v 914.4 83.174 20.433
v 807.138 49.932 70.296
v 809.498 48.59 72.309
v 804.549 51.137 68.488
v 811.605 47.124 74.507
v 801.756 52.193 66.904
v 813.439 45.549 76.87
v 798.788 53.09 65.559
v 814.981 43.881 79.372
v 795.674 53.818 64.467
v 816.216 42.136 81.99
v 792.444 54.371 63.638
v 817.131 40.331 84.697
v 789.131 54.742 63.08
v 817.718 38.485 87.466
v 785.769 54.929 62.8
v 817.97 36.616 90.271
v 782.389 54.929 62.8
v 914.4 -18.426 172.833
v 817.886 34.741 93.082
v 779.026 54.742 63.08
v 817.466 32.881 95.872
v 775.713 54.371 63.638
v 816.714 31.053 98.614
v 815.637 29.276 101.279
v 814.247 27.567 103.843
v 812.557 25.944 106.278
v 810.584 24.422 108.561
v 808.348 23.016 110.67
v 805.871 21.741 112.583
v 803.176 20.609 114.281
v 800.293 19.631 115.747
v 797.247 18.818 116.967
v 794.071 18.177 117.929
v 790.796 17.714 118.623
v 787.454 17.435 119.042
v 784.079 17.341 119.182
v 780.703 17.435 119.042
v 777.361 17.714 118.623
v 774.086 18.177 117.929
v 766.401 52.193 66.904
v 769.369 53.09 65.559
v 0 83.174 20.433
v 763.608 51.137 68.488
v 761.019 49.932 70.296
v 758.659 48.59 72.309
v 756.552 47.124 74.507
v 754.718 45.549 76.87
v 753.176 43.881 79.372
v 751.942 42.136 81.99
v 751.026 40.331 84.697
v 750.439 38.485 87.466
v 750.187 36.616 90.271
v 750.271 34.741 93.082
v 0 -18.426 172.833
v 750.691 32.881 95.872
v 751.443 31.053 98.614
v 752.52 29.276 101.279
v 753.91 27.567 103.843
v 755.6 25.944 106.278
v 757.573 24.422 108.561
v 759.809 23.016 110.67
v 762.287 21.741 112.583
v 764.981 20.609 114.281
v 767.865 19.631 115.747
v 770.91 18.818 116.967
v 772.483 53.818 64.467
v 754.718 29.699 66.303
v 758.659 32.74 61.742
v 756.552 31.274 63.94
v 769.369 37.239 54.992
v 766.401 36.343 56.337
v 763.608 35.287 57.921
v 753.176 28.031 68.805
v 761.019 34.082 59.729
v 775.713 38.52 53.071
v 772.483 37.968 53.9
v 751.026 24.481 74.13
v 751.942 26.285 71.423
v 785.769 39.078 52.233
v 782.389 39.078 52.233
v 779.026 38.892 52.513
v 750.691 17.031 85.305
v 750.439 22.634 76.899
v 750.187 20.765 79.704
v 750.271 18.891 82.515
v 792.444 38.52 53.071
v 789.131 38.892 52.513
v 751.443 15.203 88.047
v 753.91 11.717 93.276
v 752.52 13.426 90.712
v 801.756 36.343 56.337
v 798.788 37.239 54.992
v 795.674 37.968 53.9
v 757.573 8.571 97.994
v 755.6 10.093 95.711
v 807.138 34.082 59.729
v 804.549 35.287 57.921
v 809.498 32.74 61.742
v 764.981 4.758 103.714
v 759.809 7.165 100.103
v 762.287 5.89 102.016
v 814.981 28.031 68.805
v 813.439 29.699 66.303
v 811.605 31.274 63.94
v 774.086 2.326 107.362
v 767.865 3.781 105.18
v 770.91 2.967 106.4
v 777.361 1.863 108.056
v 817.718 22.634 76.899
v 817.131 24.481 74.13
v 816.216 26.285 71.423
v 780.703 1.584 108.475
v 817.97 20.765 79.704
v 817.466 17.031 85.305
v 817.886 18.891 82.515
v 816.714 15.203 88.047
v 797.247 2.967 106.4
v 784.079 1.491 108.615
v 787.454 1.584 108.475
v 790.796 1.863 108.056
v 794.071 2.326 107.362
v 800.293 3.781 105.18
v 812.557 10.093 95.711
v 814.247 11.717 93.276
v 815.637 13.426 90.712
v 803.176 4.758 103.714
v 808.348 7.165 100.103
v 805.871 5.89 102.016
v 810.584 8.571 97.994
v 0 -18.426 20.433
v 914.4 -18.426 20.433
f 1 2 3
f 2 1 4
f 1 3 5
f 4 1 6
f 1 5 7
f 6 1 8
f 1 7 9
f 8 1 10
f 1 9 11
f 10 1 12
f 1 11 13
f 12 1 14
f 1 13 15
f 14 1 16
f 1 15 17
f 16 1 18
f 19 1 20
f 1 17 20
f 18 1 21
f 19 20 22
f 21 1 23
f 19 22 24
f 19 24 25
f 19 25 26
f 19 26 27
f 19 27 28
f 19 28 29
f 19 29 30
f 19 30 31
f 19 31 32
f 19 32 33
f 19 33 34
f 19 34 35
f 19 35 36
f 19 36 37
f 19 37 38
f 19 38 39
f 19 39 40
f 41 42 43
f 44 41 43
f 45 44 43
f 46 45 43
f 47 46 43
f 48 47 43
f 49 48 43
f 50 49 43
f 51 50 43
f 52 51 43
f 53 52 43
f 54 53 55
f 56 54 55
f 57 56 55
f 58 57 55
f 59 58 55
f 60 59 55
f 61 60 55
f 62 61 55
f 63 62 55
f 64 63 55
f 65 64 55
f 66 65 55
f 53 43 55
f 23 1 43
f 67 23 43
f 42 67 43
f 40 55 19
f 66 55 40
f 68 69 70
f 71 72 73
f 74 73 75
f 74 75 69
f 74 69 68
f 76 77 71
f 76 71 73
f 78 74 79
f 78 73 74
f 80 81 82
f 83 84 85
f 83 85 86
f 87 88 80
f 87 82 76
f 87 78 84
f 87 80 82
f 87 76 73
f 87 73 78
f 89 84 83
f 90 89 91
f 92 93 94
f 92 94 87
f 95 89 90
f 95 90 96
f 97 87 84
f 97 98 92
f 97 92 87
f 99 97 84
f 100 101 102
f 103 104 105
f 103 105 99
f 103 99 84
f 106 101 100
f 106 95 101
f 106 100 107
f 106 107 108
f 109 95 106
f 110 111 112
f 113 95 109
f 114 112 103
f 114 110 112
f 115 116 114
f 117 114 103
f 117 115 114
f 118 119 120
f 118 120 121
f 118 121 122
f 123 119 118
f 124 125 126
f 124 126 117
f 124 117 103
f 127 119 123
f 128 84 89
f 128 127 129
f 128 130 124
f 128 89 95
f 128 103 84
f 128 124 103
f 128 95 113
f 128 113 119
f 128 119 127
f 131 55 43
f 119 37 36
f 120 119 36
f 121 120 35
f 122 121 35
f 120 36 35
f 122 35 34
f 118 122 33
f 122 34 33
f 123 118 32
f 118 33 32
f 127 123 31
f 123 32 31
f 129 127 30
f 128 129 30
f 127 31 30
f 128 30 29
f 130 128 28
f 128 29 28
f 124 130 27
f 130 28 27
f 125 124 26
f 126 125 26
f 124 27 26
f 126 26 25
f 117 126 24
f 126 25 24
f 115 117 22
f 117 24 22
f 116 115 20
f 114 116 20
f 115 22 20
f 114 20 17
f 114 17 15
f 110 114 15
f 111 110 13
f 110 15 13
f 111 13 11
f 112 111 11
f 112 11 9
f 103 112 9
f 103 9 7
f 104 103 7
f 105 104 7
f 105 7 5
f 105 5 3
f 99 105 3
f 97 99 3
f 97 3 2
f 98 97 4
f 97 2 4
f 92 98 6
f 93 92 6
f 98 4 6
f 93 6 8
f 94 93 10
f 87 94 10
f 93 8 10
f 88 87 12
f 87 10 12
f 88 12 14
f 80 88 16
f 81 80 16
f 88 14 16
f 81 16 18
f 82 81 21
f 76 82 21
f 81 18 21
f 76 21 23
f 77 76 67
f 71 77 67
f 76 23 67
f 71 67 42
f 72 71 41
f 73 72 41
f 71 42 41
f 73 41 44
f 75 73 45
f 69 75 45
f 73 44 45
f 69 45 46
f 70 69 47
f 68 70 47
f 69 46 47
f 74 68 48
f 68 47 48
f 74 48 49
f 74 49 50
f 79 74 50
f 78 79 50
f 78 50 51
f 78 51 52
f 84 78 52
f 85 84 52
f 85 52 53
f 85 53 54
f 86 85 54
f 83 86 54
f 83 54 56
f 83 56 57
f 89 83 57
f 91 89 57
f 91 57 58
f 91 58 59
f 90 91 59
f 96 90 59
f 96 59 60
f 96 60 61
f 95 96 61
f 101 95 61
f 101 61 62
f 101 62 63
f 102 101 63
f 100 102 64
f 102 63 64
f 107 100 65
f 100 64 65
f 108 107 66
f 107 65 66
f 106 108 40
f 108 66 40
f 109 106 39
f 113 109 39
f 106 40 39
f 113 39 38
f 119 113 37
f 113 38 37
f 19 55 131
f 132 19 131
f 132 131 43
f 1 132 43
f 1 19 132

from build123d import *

# Parameters (mm, degrees)
BOSS_EXTRUDE1_DEPTH = 914.4
SKETCH6_R           = 33.902275387
CUT_EXTRUDE1_DEPTH  = 19.05


with BuildPart() as part:
    # Sketch1 → Boss-Extrude1 (new body)
    with BuildSketch(Plane(origin=(0, 0, 0), x_dir=(0, 0, -1), z_dir=(1, 0, 0))):
        Polygon((-20.432712568, 83.174071702), (-172.832712568, -18.425928298), (-20.432712568, -18.425928298), align=None)
    extrude(amount=BOSS_EXTRUDE1_DEPTH)

    # Sketch6 → Cut-Extrude1 (cut)
    with BuildSketch(Plane(origin=(0, 67.012532364, 44.675021576), x_dir=(1, 0, 0), z_dir=(0, 0.8320502943378435, 0.5547001962252294))):
        with Locations(Location((784.078611342, -55.644211071, 0), (0, 0, 270))):
            Circle(SKETCH6_R)
    extrude(amount=-CUT_EXTRUDE1_DEPTH, mode=Mode.SUBTRACT)


solid = part.part
